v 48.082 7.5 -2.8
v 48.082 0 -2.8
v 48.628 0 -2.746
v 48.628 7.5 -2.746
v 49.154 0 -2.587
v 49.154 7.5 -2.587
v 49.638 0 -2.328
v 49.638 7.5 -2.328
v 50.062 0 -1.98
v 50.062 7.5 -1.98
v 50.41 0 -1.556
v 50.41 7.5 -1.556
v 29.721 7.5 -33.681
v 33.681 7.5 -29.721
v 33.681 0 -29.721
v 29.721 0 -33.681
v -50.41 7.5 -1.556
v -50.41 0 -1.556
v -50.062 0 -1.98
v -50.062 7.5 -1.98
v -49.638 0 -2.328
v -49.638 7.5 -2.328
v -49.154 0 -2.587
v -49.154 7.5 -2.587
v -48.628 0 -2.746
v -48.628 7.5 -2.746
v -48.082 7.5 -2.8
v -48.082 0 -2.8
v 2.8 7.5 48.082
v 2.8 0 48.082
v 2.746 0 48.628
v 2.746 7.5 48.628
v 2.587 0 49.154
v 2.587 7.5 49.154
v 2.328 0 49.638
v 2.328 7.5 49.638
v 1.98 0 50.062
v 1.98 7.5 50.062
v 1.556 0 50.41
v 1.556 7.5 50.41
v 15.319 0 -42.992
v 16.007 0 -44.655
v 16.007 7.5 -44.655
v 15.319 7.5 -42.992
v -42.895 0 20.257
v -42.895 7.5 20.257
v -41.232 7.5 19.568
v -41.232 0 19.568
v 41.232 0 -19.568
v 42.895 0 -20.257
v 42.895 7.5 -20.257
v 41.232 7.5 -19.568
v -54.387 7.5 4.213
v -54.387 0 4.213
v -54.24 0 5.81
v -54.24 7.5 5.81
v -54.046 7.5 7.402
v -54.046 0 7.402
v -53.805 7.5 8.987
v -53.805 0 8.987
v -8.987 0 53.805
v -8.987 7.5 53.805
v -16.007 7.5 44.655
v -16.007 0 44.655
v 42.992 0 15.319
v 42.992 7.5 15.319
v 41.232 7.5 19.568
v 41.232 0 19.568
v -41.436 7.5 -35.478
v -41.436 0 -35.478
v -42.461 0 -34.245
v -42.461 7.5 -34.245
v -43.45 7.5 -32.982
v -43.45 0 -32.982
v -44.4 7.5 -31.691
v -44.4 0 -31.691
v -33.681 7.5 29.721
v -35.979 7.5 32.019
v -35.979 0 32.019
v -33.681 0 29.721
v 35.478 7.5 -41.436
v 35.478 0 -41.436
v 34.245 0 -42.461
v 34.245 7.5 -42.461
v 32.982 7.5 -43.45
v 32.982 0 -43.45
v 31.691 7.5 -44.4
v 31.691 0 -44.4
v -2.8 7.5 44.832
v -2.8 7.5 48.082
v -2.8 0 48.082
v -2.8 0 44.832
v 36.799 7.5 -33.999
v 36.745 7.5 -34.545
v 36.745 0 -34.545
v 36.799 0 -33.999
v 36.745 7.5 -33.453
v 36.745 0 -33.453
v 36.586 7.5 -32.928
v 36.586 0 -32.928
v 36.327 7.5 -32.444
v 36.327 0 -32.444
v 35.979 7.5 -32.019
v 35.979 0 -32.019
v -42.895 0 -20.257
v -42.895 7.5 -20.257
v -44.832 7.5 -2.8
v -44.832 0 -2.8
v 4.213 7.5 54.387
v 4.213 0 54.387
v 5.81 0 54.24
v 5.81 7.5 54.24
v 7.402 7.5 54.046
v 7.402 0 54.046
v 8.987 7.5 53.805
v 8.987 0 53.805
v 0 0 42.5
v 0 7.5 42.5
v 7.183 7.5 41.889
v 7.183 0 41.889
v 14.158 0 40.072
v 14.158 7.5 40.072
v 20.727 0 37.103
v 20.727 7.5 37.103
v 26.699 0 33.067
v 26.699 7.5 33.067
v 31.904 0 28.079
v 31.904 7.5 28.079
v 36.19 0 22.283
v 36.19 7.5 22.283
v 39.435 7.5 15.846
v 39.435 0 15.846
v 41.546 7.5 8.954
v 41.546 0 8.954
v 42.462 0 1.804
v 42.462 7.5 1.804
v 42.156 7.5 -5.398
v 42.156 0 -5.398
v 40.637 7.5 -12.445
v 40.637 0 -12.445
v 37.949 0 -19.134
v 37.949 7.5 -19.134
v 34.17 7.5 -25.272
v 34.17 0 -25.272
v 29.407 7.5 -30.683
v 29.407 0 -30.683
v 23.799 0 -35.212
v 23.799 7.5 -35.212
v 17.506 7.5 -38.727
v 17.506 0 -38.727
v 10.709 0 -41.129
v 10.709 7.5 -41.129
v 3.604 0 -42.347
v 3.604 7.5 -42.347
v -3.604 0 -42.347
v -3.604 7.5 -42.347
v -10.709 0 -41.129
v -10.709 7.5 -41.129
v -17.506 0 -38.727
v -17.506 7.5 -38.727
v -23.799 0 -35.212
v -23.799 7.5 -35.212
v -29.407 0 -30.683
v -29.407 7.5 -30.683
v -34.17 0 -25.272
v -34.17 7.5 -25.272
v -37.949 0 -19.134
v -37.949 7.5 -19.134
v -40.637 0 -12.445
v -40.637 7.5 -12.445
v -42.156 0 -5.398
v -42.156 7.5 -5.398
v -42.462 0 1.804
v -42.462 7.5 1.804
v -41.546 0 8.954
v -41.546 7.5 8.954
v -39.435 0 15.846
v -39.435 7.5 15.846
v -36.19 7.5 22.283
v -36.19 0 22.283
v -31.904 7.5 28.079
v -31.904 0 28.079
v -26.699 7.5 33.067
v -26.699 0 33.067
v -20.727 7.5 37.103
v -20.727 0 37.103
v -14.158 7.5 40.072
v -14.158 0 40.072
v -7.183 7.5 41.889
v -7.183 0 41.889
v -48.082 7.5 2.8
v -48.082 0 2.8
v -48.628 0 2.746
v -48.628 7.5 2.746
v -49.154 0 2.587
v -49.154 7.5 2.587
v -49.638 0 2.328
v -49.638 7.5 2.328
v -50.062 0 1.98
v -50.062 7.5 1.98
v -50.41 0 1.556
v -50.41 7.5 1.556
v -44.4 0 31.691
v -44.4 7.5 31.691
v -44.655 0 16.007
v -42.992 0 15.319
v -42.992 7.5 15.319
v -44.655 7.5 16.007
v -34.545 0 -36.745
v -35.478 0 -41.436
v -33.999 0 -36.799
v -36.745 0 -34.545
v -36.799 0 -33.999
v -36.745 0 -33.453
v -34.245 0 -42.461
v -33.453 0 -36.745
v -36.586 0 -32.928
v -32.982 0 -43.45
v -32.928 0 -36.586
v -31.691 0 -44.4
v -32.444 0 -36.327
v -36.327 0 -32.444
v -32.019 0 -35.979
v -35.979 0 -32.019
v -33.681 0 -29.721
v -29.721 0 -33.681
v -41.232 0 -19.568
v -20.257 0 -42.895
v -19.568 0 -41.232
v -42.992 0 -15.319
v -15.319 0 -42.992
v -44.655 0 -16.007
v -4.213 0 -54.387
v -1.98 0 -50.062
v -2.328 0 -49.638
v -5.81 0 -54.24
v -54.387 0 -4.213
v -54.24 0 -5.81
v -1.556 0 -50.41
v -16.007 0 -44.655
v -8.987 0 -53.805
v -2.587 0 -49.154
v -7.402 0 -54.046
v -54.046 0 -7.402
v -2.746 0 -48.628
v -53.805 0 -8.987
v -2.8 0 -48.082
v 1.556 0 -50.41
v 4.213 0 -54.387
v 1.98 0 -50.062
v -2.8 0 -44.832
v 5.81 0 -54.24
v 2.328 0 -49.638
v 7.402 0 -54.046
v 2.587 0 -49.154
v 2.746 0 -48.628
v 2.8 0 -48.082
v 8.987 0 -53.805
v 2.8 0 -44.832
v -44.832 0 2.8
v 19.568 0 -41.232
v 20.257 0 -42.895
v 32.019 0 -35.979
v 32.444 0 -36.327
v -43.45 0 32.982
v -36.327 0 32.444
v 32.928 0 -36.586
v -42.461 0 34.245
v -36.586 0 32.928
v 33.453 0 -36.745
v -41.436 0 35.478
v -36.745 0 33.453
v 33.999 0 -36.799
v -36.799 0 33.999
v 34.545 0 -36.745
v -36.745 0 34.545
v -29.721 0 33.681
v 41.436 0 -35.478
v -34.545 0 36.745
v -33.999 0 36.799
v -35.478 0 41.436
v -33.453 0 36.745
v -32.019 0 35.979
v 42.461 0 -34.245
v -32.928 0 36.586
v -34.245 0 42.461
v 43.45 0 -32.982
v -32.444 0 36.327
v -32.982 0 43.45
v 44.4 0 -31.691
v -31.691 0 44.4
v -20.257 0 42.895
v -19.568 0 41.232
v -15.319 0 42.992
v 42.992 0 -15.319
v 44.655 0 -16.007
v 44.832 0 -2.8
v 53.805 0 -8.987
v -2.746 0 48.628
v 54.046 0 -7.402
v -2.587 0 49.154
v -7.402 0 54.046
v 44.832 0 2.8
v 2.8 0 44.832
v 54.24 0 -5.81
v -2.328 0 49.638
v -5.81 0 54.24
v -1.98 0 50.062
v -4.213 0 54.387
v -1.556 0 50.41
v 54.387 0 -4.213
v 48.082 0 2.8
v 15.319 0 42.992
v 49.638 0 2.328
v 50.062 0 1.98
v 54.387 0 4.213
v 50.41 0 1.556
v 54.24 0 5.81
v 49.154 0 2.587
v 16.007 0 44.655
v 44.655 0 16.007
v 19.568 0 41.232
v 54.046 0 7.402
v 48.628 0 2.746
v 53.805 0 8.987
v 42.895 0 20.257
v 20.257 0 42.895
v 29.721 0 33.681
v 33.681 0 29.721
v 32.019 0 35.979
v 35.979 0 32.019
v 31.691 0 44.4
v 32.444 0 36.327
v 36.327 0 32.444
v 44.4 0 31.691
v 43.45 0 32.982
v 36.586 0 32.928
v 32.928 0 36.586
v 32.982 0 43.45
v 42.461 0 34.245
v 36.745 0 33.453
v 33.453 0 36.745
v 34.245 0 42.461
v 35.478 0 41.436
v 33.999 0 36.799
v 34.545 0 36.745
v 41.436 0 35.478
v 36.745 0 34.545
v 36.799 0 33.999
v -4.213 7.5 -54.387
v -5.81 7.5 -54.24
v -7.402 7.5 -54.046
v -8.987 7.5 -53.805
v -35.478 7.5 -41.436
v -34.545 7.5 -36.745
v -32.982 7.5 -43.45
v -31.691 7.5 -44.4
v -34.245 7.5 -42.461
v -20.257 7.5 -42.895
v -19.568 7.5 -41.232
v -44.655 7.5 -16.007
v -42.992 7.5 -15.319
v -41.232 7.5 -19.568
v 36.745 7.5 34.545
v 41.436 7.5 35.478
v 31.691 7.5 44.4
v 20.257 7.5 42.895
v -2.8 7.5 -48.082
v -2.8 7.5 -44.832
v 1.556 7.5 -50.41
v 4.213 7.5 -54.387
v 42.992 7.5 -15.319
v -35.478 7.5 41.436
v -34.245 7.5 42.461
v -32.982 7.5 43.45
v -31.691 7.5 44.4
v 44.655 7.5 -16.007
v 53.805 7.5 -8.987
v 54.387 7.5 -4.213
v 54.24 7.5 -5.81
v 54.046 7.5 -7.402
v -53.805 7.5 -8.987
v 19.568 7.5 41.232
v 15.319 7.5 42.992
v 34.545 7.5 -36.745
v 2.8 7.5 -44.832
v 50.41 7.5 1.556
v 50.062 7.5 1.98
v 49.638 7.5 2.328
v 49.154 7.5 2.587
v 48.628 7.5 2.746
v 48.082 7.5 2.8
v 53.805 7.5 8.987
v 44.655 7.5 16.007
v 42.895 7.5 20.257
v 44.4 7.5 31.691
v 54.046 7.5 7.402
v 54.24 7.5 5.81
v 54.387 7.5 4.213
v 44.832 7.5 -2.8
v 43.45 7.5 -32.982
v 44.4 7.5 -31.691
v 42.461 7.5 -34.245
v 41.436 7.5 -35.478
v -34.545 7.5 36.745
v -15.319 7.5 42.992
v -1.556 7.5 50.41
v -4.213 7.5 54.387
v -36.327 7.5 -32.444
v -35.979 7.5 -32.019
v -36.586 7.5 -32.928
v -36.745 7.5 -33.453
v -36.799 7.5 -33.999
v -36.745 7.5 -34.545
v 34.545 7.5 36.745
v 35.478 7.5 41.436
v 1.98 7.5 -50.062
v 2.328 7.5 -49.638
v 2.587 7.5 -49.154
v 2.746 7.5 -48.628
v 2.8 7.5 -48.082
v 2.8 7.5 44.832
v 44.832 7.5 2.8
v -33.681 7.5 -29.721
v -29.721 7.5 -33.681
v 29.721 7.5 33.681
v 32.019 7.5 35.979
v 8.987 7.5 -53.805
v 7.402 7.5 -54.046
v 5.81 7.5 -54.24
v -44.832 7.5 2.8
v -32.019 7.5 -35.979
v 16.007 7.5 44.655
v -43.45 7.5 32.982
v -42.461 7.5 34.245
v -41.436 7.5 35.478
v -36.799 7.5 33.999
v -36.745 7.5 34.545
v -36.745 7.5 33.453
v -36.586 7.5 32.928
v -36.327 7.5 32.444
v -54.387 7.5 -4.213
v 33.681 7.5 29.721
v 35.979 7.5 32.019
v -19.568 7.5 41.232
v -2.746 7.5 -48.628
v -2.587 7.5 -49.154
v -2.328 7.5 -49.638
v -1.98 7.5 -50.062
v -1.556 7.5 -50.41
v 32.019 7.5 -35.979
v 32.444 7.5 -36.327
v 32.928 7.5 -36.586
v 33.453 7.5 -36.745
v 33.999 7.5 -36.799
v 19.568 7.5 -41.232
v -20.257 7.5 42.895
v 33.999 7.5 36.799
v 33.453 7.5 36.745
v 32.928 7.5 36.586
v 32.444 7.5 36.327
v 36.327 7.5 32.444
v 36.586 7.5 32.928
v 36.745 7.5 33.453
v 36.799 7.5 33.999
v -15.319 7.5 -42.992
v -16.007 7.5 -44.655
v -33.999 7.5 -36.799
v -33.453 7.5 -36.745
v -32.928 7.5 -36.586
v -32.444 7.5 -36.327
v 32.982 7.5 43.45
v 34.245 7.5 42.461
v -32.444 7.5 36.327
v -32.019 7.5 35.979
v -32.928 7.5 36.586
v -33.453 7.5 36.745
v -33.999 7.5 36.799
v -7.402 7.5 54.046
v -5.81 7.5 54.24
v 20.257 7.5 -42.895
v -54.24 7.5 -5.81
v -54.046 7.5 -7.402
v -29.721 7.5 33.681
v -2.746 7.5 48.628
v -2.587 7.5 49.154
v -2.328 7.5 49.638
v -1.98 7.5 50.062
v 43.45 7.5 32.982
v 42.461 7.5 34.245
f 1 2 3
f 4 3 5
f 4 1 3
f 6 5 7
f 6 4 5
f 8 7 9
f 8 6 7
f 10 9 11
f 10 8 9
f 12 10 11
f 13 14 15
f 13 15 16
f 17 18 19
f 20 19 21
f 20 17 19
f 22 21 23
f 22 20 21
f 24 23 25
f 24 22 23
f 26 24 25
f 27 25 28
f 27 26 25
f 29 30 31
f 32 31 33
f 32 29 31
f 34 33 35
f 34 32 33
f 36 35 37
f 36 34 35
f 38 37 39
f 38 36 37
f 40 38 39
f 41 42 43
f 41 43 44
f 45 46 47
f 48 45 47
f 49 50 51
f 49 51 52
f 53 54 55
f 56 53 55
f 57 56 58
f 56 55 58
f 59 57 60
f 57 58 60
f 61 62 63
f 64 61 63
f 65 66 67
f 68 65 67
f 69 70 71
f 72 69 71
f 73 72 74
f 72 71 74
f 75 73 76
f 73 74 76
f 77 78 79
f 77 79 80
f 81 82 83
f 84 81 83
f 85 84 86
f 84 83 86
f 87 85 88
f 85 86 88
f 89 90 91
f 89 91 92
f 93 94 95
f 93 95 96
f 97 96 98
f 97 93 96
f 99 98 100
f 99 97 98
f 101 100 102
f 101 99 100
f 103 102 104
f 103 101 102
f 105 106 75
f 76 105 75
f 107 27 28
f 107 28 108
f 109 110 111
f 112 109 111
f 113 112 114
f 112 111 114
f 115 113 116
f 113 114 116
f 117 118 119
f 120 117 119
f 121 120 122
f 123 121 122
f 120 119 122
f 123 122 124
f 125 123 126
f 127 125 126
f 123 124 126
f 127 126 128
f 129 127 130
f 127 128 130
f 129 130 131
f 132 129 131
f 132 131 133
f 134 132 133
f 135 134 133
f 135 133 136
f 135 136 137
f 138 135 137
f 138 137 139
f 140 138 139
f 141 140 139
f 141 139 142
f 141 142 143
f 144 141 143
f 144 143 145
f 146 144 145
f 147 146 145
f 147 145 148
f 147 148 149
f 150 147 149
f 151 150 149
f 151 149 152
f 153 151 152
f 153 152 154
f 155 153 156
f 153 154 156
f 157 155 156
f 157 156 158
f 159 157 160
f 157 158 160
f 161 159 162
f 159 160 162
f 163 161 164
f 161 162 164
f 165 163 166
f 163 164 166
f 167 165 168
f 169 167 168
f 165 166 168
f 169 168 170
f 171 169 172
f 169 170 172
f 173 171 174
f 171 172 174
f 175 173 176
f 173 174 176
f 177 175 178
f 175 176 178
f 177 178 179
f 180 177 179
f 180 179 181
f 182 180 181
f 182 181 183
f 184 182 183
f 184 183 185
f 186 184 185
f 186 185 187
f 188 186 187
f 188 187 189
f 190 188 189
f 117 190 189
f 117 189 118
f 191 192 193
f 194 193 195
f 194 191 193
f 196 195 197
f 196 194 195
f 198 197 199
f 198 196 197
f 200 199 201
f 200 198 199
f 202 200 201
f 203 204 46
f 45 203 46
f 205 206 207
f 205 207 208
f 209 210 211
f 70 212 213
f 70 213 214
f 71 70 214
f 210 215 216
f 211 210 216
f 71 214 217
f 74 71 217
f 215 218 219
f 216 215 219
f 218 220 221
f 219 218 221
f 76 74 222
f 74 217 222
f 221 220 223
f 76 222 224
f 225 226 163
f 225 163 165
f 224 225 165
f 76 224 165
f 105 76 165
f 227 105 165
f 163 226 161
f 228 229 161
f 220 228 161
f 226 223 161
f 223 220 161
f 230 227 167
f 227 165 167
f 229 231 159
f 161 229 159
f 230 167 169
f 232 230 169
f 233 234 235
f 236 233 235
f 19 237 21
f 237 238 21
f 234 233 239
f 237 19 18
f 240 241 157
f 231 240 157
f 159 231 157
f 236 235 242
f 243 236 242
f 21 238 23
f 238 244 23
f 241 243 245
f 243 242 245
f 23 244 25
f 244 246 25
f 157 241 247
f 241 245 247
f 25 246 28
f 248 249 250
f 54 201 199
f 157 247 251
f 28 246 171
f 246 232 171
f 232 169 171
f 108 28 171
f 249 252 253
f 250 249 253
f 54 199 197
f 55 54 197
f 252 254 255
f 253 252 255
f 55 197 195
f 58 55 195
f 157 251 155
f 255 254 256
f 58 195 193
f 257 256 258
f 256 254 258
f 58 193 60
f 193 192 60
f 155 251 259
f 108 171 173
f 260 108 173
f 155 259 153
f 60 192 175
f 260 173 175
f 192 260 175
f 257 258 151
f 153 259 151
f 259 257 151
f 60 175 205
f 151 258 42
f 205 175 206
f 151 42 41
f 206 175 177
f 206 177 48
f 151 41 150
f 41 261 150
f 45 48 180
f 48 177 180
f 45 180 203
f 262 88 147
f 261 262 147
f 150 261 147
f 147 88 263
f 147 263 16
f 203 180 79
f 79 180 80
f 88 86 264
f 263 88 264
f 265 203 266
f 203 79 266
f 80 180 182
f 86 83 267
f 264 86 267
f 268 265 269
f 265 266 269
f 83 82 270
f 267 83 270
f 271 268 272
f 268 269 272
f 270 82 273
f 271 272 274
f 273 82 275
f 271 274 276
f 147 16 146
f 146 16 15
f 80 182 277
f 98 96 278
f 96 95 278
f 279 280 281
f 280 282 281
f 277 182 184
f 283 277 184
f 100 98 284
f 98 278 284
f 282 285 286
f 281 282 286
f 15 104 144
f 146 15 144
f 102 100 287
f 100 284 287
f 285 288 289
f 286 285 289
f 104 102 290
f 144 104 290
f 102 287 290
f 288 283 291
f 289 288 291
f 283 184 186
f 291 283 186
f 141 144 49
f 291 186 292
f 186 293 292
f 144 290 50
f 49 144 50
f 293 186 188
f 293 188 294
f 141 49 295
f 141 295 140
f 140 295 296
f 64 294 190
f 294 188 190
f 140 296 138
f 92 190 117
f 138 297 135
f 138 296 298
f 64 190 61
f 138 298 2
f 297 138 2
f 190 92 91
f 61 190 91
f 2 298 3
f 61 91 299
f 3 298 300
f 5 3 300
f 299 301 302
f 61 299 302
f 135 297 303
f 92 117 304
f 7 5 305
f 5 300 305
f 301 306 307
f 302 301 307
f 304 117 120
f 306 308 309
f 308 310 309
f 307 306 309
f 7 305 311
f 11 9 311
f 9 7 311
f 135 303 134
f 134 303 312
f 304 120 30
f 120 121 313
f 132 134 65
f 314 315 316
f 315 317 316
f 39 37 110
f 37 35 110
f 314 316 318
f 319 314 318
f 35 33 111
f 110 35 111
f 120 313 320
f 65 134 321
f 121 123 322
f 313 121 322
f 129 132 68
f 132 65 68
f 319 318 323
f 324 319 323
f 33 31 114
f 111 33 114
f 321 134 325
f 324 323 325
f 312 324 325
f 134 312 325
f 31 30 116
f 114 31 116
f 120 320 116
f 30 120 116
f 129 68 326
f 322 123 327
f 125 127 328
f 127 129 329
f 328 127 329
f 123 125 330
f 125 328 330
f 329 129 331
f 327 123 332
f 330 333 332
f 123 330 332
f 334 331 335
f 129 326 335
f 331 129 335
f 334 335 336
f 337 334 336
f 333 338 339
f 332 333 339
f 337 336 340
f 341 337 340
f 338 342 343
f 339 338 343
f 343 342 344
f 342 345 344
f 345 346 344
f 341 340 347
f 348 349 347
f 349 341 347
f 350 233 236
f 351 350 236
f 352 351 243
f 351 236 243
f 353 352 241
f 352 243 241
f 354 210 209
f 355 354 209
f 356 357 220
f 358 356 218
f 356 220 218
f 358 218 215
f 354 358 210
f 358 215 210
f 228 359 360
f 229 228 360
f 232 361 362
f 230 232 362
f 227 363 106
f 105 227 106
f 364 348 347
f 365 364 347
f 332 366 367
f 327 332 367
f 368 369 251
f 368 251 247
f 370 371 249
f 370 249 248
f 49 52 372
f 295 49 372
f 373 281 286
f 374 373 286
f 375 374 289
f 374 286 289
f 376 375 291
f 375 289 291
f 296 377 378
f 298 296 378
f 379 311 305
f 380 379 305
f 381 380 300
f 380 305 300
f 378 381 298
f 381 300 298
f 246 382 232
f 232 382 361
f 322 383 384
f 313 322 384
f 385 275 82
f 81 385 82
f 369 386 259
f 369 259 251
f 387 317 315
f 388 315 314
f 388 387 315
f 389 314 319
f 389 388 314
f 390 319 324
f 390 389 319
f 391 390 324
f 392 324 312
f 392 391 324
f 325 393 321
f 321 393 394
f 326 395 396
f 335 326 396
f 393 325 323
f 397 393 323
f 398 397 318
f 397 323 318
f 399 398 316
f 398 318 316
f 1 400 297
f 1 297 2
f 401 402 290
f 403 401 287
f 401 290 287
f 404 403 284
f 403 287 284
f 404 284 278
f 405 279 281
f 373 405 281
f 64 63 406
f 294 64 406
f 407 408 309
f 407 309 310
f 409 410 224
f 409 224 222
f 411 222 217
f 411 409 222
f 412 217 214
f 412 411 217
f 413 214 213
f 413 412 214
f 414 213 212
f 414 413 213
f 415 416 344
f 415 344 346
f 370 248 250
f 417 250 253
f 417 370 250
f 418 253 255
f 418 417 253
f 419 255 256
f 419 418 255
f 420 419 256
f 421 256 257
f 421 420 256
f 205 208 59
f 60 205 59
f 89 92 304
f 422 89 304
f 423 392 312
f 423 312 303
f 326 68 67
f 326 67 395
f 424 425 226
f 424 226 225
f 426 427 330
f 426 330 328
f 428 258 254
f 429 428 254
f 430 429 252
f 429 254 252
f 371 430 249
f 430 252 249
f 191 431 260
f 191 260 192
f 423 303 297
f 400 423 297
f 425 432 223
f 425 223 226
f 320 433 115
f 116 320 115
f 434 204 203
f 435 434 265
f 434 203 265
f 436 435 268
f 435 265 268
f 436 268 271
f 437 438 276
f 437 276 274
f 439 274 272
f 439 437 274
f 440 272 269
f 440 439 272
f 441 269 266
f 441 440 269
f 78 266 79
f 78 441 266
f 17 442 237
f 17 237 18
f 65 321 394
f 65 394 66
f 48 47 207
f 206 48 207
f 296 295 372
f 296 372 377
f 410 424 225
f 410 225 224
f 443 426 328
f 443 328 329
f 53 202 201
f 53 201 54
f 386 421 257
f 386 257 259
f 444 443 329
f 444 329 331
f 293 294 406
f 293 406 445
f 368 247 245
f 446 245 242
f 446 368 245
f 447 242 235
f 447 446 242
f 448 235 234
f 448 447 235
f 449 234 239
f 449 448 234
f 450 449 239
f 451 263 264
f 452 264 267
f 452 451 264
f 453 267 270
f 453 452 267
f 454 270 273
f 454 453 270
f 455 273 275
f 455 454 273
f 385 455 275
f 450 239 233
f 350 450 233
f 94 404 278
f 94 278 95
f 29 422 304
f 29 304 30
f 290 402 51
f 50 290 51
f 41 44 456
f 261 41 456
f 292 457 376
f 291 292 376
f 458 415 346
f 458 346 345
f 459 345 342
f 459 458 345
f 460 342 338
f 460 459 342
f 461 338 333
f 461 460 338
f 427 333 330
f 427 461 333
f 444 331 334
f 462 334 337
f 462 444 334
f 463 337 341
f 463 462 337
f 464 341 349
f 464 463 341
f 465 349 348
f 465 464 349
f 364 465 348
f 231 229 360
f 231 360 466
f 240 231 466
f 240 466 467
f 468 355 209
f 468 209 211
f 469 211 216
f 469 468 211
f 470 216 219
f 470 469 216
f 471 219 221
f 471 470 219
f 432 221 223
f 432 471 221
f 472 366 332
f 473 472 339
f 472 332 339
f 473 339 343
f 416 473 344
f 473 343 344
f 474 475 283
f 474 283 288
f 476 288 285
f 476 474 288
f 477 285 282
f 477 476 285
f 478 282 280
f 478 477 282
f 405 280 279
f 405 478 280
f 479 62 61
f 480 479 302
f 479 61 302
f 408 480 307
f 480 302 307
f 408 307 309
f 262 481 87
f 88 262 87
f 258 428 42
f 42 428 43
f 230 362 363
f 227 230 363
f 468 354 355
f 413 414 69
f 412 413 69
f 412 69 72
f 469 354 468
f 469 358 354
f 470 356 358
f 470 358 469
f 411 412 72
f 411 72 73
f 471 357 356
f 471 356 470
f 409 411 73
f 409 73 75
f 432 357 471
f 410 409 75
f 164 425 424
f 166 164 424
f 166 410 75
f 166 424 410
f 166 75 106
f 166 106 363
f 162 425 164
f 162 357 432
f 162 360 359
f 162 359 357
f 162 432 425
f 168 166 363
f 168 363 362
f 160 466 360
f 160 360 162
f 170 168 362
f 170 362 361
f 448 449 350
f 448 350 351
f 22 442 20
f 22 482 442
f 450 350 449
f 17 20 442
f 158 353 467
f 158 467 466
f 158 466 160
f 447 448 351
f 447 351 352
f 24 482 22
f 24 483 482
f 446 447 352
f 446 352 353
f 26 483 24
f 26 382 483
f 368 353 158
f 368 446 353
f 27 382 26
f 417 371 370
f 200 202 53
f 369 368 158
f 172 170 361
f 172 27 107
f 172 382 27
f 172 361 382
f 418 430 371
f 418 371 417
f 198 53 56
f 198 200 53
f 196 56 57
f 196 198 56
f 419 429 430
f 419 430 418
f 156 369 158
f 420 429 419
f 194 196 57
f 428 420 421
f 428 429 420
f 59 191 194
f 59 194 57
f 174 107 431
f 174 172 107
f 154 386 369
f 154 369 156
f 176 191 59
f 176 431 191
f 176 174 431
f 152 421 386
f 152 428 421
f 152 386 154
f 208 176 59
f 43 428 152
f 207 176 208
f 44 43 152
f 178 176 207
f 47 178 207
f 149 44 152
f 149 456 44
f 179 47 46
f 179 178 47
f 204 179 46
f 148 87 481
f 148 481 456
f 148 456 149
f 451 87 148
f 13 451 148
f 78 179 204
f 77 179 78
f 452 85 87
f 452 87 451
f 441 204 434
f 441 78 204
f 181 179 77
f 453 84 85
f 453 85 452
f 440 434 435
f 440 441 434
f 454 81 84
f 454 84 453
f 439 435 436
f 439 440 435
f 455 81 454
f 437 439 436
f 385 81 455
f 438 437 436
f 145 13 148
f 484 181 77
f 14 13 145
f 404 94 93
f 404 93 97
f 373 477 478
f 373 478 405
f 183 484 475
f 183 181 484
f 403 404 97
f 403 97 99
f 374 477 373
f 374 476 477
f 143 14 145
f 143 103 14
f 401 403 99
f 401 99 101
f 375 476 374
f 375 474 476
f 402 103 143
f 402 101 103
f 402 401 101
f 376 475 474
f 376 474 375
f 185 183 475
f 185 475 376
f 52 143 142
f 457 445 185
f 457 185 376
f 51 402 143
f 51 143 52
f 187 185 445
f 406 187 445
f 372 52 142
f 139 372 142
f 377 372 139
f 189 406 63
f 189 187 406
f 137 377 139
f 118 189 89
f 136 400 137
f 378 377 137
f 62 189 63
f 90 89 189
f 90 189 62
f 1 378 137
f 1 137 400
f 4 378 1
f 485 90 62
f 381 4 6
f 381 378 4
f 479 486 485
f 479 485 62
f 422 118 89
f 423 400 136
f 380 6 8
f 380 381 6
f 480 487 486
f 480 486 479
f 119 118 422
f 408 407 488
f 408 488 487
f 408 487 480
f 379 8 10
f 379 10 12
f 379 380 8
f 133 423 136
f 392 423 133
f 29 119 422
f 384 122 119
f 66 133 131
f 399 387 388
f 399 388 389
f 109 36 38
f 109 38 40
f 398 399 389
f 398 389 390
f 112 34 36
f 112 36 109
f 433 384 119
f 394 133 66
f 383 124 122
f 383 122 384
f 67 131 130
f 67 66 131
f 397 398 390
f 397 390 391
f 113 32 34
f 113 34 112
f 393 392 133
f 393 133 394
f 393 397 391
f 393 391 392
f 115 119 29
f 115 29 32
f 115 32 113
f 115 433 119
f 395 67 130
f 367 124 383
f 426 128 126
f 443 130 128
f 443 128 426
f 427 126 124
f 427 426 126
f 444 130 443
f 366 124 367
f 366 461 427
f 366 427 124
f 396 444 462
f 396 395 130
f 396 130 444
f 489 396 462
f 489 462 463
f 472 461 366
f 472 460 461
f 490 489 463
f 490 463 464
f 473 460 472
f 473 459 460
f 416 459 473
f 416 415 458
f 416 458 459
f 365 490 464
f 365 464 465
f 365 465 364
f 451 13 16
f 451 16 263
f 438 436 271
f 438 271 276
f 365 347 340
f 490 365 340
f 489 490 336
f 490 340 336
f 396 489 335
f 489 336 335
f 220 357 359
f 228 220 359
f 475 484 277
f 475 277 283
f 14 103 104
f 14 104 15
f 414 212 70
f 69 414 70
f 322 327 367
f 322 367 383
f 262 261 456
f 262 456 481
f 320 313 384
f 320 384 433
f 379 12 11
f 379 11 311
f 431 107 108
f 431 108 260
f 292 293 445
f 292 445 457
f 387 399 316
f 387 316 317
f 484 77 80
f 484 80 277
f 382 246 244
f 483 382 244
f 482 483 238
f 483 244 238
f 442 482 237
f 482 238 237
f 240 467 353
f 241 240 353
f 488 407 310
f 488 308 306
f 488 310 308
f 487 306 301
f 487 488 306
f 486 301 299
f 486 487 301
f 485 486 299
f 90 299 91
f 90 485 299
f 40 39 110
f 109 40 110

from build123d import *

# Parameters (mm, degrees)
SKETCH1_R           = 54.55
BOSS_EXTRUDE1_DEPTH = 7.5
SKETCH2_R           = 42.5
CUT_EXTRUDE1_DEPTH  = 78.509063986
CUT_EXTRUDE2_DEPTH  = 78.509063986
CUT_EXTRUDE6_DEPTH  = 78.509063986
CIRPATTERN1_COUNT   = 8
CIRPATTERN2_COUNT   = 8


with BuildPart() as part:
    # Sketch1 → Boss-Extrude1 (new body)
    with BuildSketch(Plane(origin=(0, 0, 0), x_dir=(1, 0, 0), z_dir=(0, 1, 0))):
        Circle(SKETCH1_R)
    extrude(amount=BOSS_EXTRUDE1_DEPTH)

    # Sketch2 → Cut-Extrude1 (cut, through all)
    with BuildSketch(Plane(origin=(0, 7.5, 0), x_dir=(1, 0, 0), z_dir=(0, 1, 0))):
        Circle(SKETCH2_R)
    extrude(amount=-CUT_EXTRUDE1_DEPTH, mode=Mode.SUBTRACT)

    # Sketch3 → Cut-Extrude2 (cut, through all)
    with BuildSketch(Plane(origin=(0, 7.5, 0), x_dir=(1, 0, 0), z_dir=(0, 1, 0))):
        with BuildLine():
            Line((-2.8, -48.082), (-2.8, -44.832))
            Line((-2.8, -44.832), (2.8, -44.832))
            Line((2.8, -44.832), (2.8, -48.082))
            ThreePointArc((2.8, -48.082), (2.46937954, -49.401910863), (1.555596652, -50.410114914))
            Line((1.555596652, -50.410114914), (4.212915889, -54.387074197))
            ThreePointArc((4.212915889, -54.387074197), (0, -54.55), (-4.212915889, -54.387074197))
            Line((-4.212915889, -54.387074197), (-1.555596652, -50.410114914))
            ThreePointArc((-1.555596652, -50.410114914), (-2.46937954, -49.401910863), (-2.8, -48.082))
        make_face()
    cut_extrude2 = extrude(amount=-CUT_EXTRUDE2_DEPTH, mode=Mode.SUBTRACT)

    # Sketch9 → Cut-Extrude6 (cut, through all)
    with BuildSketch(Plane(origin=(0, 7.5, 0), x_dir=(1, 0, 0), z_dir=(0, 1, 0))):
        with BuildLine():
            Line((-20.257229317, -42.895088115), (-31.690865911, -44.400354929))
            ThreePointArc((-31.690865911, -44.400354929), (-20.875381236, -50.397628498), (-8.98696587, -53.804618245))
            Line((-8.98696587, -53.804618245), (-16.007383468, -44.655431904))
            Line((-16.007383468, -44.655431904), (-15.318553289, -42.992448745))
            Line((-15.318553289, -42.992448745), (-19.568399139, -41.232104956))
            Line((-19.568399139, -41.232104956), (-20.257229317, -42.895088115))
        make_face()
    cut_extrude6 = extrude(amount=-CUT_EXTRUDE6_DEPTH, mode=Mode.SUBTRACT)

    # CirPattern1: Cut-Extrude2 ×8 about axis
    cirpattern1_axis = Axis((0, 10.872185225, 0), (0, -1, 0))
    for i in range(1, CIRPATTERN1_COUNT):
        add(cut_extrude2.rotate(cirpattern1_axis, i * 360 / CIRPATTERN1_COUNT), mode=Mode.SUBTRACT)

    # CirPattern2: Cut-Extrude6 ×8 about axis
    cirpattern2_axis = Axis((0, 10.872185225, 0), (0, -1, 0))
    for i in range(1, CIRPATTERN2_COUNT):
        add(cut_extrude6.rotate(cirpattern2_axis, i * 360 / CIRPATTERN2_COUNT), mode=Mode.SUBTRACT)


solid = part.part
